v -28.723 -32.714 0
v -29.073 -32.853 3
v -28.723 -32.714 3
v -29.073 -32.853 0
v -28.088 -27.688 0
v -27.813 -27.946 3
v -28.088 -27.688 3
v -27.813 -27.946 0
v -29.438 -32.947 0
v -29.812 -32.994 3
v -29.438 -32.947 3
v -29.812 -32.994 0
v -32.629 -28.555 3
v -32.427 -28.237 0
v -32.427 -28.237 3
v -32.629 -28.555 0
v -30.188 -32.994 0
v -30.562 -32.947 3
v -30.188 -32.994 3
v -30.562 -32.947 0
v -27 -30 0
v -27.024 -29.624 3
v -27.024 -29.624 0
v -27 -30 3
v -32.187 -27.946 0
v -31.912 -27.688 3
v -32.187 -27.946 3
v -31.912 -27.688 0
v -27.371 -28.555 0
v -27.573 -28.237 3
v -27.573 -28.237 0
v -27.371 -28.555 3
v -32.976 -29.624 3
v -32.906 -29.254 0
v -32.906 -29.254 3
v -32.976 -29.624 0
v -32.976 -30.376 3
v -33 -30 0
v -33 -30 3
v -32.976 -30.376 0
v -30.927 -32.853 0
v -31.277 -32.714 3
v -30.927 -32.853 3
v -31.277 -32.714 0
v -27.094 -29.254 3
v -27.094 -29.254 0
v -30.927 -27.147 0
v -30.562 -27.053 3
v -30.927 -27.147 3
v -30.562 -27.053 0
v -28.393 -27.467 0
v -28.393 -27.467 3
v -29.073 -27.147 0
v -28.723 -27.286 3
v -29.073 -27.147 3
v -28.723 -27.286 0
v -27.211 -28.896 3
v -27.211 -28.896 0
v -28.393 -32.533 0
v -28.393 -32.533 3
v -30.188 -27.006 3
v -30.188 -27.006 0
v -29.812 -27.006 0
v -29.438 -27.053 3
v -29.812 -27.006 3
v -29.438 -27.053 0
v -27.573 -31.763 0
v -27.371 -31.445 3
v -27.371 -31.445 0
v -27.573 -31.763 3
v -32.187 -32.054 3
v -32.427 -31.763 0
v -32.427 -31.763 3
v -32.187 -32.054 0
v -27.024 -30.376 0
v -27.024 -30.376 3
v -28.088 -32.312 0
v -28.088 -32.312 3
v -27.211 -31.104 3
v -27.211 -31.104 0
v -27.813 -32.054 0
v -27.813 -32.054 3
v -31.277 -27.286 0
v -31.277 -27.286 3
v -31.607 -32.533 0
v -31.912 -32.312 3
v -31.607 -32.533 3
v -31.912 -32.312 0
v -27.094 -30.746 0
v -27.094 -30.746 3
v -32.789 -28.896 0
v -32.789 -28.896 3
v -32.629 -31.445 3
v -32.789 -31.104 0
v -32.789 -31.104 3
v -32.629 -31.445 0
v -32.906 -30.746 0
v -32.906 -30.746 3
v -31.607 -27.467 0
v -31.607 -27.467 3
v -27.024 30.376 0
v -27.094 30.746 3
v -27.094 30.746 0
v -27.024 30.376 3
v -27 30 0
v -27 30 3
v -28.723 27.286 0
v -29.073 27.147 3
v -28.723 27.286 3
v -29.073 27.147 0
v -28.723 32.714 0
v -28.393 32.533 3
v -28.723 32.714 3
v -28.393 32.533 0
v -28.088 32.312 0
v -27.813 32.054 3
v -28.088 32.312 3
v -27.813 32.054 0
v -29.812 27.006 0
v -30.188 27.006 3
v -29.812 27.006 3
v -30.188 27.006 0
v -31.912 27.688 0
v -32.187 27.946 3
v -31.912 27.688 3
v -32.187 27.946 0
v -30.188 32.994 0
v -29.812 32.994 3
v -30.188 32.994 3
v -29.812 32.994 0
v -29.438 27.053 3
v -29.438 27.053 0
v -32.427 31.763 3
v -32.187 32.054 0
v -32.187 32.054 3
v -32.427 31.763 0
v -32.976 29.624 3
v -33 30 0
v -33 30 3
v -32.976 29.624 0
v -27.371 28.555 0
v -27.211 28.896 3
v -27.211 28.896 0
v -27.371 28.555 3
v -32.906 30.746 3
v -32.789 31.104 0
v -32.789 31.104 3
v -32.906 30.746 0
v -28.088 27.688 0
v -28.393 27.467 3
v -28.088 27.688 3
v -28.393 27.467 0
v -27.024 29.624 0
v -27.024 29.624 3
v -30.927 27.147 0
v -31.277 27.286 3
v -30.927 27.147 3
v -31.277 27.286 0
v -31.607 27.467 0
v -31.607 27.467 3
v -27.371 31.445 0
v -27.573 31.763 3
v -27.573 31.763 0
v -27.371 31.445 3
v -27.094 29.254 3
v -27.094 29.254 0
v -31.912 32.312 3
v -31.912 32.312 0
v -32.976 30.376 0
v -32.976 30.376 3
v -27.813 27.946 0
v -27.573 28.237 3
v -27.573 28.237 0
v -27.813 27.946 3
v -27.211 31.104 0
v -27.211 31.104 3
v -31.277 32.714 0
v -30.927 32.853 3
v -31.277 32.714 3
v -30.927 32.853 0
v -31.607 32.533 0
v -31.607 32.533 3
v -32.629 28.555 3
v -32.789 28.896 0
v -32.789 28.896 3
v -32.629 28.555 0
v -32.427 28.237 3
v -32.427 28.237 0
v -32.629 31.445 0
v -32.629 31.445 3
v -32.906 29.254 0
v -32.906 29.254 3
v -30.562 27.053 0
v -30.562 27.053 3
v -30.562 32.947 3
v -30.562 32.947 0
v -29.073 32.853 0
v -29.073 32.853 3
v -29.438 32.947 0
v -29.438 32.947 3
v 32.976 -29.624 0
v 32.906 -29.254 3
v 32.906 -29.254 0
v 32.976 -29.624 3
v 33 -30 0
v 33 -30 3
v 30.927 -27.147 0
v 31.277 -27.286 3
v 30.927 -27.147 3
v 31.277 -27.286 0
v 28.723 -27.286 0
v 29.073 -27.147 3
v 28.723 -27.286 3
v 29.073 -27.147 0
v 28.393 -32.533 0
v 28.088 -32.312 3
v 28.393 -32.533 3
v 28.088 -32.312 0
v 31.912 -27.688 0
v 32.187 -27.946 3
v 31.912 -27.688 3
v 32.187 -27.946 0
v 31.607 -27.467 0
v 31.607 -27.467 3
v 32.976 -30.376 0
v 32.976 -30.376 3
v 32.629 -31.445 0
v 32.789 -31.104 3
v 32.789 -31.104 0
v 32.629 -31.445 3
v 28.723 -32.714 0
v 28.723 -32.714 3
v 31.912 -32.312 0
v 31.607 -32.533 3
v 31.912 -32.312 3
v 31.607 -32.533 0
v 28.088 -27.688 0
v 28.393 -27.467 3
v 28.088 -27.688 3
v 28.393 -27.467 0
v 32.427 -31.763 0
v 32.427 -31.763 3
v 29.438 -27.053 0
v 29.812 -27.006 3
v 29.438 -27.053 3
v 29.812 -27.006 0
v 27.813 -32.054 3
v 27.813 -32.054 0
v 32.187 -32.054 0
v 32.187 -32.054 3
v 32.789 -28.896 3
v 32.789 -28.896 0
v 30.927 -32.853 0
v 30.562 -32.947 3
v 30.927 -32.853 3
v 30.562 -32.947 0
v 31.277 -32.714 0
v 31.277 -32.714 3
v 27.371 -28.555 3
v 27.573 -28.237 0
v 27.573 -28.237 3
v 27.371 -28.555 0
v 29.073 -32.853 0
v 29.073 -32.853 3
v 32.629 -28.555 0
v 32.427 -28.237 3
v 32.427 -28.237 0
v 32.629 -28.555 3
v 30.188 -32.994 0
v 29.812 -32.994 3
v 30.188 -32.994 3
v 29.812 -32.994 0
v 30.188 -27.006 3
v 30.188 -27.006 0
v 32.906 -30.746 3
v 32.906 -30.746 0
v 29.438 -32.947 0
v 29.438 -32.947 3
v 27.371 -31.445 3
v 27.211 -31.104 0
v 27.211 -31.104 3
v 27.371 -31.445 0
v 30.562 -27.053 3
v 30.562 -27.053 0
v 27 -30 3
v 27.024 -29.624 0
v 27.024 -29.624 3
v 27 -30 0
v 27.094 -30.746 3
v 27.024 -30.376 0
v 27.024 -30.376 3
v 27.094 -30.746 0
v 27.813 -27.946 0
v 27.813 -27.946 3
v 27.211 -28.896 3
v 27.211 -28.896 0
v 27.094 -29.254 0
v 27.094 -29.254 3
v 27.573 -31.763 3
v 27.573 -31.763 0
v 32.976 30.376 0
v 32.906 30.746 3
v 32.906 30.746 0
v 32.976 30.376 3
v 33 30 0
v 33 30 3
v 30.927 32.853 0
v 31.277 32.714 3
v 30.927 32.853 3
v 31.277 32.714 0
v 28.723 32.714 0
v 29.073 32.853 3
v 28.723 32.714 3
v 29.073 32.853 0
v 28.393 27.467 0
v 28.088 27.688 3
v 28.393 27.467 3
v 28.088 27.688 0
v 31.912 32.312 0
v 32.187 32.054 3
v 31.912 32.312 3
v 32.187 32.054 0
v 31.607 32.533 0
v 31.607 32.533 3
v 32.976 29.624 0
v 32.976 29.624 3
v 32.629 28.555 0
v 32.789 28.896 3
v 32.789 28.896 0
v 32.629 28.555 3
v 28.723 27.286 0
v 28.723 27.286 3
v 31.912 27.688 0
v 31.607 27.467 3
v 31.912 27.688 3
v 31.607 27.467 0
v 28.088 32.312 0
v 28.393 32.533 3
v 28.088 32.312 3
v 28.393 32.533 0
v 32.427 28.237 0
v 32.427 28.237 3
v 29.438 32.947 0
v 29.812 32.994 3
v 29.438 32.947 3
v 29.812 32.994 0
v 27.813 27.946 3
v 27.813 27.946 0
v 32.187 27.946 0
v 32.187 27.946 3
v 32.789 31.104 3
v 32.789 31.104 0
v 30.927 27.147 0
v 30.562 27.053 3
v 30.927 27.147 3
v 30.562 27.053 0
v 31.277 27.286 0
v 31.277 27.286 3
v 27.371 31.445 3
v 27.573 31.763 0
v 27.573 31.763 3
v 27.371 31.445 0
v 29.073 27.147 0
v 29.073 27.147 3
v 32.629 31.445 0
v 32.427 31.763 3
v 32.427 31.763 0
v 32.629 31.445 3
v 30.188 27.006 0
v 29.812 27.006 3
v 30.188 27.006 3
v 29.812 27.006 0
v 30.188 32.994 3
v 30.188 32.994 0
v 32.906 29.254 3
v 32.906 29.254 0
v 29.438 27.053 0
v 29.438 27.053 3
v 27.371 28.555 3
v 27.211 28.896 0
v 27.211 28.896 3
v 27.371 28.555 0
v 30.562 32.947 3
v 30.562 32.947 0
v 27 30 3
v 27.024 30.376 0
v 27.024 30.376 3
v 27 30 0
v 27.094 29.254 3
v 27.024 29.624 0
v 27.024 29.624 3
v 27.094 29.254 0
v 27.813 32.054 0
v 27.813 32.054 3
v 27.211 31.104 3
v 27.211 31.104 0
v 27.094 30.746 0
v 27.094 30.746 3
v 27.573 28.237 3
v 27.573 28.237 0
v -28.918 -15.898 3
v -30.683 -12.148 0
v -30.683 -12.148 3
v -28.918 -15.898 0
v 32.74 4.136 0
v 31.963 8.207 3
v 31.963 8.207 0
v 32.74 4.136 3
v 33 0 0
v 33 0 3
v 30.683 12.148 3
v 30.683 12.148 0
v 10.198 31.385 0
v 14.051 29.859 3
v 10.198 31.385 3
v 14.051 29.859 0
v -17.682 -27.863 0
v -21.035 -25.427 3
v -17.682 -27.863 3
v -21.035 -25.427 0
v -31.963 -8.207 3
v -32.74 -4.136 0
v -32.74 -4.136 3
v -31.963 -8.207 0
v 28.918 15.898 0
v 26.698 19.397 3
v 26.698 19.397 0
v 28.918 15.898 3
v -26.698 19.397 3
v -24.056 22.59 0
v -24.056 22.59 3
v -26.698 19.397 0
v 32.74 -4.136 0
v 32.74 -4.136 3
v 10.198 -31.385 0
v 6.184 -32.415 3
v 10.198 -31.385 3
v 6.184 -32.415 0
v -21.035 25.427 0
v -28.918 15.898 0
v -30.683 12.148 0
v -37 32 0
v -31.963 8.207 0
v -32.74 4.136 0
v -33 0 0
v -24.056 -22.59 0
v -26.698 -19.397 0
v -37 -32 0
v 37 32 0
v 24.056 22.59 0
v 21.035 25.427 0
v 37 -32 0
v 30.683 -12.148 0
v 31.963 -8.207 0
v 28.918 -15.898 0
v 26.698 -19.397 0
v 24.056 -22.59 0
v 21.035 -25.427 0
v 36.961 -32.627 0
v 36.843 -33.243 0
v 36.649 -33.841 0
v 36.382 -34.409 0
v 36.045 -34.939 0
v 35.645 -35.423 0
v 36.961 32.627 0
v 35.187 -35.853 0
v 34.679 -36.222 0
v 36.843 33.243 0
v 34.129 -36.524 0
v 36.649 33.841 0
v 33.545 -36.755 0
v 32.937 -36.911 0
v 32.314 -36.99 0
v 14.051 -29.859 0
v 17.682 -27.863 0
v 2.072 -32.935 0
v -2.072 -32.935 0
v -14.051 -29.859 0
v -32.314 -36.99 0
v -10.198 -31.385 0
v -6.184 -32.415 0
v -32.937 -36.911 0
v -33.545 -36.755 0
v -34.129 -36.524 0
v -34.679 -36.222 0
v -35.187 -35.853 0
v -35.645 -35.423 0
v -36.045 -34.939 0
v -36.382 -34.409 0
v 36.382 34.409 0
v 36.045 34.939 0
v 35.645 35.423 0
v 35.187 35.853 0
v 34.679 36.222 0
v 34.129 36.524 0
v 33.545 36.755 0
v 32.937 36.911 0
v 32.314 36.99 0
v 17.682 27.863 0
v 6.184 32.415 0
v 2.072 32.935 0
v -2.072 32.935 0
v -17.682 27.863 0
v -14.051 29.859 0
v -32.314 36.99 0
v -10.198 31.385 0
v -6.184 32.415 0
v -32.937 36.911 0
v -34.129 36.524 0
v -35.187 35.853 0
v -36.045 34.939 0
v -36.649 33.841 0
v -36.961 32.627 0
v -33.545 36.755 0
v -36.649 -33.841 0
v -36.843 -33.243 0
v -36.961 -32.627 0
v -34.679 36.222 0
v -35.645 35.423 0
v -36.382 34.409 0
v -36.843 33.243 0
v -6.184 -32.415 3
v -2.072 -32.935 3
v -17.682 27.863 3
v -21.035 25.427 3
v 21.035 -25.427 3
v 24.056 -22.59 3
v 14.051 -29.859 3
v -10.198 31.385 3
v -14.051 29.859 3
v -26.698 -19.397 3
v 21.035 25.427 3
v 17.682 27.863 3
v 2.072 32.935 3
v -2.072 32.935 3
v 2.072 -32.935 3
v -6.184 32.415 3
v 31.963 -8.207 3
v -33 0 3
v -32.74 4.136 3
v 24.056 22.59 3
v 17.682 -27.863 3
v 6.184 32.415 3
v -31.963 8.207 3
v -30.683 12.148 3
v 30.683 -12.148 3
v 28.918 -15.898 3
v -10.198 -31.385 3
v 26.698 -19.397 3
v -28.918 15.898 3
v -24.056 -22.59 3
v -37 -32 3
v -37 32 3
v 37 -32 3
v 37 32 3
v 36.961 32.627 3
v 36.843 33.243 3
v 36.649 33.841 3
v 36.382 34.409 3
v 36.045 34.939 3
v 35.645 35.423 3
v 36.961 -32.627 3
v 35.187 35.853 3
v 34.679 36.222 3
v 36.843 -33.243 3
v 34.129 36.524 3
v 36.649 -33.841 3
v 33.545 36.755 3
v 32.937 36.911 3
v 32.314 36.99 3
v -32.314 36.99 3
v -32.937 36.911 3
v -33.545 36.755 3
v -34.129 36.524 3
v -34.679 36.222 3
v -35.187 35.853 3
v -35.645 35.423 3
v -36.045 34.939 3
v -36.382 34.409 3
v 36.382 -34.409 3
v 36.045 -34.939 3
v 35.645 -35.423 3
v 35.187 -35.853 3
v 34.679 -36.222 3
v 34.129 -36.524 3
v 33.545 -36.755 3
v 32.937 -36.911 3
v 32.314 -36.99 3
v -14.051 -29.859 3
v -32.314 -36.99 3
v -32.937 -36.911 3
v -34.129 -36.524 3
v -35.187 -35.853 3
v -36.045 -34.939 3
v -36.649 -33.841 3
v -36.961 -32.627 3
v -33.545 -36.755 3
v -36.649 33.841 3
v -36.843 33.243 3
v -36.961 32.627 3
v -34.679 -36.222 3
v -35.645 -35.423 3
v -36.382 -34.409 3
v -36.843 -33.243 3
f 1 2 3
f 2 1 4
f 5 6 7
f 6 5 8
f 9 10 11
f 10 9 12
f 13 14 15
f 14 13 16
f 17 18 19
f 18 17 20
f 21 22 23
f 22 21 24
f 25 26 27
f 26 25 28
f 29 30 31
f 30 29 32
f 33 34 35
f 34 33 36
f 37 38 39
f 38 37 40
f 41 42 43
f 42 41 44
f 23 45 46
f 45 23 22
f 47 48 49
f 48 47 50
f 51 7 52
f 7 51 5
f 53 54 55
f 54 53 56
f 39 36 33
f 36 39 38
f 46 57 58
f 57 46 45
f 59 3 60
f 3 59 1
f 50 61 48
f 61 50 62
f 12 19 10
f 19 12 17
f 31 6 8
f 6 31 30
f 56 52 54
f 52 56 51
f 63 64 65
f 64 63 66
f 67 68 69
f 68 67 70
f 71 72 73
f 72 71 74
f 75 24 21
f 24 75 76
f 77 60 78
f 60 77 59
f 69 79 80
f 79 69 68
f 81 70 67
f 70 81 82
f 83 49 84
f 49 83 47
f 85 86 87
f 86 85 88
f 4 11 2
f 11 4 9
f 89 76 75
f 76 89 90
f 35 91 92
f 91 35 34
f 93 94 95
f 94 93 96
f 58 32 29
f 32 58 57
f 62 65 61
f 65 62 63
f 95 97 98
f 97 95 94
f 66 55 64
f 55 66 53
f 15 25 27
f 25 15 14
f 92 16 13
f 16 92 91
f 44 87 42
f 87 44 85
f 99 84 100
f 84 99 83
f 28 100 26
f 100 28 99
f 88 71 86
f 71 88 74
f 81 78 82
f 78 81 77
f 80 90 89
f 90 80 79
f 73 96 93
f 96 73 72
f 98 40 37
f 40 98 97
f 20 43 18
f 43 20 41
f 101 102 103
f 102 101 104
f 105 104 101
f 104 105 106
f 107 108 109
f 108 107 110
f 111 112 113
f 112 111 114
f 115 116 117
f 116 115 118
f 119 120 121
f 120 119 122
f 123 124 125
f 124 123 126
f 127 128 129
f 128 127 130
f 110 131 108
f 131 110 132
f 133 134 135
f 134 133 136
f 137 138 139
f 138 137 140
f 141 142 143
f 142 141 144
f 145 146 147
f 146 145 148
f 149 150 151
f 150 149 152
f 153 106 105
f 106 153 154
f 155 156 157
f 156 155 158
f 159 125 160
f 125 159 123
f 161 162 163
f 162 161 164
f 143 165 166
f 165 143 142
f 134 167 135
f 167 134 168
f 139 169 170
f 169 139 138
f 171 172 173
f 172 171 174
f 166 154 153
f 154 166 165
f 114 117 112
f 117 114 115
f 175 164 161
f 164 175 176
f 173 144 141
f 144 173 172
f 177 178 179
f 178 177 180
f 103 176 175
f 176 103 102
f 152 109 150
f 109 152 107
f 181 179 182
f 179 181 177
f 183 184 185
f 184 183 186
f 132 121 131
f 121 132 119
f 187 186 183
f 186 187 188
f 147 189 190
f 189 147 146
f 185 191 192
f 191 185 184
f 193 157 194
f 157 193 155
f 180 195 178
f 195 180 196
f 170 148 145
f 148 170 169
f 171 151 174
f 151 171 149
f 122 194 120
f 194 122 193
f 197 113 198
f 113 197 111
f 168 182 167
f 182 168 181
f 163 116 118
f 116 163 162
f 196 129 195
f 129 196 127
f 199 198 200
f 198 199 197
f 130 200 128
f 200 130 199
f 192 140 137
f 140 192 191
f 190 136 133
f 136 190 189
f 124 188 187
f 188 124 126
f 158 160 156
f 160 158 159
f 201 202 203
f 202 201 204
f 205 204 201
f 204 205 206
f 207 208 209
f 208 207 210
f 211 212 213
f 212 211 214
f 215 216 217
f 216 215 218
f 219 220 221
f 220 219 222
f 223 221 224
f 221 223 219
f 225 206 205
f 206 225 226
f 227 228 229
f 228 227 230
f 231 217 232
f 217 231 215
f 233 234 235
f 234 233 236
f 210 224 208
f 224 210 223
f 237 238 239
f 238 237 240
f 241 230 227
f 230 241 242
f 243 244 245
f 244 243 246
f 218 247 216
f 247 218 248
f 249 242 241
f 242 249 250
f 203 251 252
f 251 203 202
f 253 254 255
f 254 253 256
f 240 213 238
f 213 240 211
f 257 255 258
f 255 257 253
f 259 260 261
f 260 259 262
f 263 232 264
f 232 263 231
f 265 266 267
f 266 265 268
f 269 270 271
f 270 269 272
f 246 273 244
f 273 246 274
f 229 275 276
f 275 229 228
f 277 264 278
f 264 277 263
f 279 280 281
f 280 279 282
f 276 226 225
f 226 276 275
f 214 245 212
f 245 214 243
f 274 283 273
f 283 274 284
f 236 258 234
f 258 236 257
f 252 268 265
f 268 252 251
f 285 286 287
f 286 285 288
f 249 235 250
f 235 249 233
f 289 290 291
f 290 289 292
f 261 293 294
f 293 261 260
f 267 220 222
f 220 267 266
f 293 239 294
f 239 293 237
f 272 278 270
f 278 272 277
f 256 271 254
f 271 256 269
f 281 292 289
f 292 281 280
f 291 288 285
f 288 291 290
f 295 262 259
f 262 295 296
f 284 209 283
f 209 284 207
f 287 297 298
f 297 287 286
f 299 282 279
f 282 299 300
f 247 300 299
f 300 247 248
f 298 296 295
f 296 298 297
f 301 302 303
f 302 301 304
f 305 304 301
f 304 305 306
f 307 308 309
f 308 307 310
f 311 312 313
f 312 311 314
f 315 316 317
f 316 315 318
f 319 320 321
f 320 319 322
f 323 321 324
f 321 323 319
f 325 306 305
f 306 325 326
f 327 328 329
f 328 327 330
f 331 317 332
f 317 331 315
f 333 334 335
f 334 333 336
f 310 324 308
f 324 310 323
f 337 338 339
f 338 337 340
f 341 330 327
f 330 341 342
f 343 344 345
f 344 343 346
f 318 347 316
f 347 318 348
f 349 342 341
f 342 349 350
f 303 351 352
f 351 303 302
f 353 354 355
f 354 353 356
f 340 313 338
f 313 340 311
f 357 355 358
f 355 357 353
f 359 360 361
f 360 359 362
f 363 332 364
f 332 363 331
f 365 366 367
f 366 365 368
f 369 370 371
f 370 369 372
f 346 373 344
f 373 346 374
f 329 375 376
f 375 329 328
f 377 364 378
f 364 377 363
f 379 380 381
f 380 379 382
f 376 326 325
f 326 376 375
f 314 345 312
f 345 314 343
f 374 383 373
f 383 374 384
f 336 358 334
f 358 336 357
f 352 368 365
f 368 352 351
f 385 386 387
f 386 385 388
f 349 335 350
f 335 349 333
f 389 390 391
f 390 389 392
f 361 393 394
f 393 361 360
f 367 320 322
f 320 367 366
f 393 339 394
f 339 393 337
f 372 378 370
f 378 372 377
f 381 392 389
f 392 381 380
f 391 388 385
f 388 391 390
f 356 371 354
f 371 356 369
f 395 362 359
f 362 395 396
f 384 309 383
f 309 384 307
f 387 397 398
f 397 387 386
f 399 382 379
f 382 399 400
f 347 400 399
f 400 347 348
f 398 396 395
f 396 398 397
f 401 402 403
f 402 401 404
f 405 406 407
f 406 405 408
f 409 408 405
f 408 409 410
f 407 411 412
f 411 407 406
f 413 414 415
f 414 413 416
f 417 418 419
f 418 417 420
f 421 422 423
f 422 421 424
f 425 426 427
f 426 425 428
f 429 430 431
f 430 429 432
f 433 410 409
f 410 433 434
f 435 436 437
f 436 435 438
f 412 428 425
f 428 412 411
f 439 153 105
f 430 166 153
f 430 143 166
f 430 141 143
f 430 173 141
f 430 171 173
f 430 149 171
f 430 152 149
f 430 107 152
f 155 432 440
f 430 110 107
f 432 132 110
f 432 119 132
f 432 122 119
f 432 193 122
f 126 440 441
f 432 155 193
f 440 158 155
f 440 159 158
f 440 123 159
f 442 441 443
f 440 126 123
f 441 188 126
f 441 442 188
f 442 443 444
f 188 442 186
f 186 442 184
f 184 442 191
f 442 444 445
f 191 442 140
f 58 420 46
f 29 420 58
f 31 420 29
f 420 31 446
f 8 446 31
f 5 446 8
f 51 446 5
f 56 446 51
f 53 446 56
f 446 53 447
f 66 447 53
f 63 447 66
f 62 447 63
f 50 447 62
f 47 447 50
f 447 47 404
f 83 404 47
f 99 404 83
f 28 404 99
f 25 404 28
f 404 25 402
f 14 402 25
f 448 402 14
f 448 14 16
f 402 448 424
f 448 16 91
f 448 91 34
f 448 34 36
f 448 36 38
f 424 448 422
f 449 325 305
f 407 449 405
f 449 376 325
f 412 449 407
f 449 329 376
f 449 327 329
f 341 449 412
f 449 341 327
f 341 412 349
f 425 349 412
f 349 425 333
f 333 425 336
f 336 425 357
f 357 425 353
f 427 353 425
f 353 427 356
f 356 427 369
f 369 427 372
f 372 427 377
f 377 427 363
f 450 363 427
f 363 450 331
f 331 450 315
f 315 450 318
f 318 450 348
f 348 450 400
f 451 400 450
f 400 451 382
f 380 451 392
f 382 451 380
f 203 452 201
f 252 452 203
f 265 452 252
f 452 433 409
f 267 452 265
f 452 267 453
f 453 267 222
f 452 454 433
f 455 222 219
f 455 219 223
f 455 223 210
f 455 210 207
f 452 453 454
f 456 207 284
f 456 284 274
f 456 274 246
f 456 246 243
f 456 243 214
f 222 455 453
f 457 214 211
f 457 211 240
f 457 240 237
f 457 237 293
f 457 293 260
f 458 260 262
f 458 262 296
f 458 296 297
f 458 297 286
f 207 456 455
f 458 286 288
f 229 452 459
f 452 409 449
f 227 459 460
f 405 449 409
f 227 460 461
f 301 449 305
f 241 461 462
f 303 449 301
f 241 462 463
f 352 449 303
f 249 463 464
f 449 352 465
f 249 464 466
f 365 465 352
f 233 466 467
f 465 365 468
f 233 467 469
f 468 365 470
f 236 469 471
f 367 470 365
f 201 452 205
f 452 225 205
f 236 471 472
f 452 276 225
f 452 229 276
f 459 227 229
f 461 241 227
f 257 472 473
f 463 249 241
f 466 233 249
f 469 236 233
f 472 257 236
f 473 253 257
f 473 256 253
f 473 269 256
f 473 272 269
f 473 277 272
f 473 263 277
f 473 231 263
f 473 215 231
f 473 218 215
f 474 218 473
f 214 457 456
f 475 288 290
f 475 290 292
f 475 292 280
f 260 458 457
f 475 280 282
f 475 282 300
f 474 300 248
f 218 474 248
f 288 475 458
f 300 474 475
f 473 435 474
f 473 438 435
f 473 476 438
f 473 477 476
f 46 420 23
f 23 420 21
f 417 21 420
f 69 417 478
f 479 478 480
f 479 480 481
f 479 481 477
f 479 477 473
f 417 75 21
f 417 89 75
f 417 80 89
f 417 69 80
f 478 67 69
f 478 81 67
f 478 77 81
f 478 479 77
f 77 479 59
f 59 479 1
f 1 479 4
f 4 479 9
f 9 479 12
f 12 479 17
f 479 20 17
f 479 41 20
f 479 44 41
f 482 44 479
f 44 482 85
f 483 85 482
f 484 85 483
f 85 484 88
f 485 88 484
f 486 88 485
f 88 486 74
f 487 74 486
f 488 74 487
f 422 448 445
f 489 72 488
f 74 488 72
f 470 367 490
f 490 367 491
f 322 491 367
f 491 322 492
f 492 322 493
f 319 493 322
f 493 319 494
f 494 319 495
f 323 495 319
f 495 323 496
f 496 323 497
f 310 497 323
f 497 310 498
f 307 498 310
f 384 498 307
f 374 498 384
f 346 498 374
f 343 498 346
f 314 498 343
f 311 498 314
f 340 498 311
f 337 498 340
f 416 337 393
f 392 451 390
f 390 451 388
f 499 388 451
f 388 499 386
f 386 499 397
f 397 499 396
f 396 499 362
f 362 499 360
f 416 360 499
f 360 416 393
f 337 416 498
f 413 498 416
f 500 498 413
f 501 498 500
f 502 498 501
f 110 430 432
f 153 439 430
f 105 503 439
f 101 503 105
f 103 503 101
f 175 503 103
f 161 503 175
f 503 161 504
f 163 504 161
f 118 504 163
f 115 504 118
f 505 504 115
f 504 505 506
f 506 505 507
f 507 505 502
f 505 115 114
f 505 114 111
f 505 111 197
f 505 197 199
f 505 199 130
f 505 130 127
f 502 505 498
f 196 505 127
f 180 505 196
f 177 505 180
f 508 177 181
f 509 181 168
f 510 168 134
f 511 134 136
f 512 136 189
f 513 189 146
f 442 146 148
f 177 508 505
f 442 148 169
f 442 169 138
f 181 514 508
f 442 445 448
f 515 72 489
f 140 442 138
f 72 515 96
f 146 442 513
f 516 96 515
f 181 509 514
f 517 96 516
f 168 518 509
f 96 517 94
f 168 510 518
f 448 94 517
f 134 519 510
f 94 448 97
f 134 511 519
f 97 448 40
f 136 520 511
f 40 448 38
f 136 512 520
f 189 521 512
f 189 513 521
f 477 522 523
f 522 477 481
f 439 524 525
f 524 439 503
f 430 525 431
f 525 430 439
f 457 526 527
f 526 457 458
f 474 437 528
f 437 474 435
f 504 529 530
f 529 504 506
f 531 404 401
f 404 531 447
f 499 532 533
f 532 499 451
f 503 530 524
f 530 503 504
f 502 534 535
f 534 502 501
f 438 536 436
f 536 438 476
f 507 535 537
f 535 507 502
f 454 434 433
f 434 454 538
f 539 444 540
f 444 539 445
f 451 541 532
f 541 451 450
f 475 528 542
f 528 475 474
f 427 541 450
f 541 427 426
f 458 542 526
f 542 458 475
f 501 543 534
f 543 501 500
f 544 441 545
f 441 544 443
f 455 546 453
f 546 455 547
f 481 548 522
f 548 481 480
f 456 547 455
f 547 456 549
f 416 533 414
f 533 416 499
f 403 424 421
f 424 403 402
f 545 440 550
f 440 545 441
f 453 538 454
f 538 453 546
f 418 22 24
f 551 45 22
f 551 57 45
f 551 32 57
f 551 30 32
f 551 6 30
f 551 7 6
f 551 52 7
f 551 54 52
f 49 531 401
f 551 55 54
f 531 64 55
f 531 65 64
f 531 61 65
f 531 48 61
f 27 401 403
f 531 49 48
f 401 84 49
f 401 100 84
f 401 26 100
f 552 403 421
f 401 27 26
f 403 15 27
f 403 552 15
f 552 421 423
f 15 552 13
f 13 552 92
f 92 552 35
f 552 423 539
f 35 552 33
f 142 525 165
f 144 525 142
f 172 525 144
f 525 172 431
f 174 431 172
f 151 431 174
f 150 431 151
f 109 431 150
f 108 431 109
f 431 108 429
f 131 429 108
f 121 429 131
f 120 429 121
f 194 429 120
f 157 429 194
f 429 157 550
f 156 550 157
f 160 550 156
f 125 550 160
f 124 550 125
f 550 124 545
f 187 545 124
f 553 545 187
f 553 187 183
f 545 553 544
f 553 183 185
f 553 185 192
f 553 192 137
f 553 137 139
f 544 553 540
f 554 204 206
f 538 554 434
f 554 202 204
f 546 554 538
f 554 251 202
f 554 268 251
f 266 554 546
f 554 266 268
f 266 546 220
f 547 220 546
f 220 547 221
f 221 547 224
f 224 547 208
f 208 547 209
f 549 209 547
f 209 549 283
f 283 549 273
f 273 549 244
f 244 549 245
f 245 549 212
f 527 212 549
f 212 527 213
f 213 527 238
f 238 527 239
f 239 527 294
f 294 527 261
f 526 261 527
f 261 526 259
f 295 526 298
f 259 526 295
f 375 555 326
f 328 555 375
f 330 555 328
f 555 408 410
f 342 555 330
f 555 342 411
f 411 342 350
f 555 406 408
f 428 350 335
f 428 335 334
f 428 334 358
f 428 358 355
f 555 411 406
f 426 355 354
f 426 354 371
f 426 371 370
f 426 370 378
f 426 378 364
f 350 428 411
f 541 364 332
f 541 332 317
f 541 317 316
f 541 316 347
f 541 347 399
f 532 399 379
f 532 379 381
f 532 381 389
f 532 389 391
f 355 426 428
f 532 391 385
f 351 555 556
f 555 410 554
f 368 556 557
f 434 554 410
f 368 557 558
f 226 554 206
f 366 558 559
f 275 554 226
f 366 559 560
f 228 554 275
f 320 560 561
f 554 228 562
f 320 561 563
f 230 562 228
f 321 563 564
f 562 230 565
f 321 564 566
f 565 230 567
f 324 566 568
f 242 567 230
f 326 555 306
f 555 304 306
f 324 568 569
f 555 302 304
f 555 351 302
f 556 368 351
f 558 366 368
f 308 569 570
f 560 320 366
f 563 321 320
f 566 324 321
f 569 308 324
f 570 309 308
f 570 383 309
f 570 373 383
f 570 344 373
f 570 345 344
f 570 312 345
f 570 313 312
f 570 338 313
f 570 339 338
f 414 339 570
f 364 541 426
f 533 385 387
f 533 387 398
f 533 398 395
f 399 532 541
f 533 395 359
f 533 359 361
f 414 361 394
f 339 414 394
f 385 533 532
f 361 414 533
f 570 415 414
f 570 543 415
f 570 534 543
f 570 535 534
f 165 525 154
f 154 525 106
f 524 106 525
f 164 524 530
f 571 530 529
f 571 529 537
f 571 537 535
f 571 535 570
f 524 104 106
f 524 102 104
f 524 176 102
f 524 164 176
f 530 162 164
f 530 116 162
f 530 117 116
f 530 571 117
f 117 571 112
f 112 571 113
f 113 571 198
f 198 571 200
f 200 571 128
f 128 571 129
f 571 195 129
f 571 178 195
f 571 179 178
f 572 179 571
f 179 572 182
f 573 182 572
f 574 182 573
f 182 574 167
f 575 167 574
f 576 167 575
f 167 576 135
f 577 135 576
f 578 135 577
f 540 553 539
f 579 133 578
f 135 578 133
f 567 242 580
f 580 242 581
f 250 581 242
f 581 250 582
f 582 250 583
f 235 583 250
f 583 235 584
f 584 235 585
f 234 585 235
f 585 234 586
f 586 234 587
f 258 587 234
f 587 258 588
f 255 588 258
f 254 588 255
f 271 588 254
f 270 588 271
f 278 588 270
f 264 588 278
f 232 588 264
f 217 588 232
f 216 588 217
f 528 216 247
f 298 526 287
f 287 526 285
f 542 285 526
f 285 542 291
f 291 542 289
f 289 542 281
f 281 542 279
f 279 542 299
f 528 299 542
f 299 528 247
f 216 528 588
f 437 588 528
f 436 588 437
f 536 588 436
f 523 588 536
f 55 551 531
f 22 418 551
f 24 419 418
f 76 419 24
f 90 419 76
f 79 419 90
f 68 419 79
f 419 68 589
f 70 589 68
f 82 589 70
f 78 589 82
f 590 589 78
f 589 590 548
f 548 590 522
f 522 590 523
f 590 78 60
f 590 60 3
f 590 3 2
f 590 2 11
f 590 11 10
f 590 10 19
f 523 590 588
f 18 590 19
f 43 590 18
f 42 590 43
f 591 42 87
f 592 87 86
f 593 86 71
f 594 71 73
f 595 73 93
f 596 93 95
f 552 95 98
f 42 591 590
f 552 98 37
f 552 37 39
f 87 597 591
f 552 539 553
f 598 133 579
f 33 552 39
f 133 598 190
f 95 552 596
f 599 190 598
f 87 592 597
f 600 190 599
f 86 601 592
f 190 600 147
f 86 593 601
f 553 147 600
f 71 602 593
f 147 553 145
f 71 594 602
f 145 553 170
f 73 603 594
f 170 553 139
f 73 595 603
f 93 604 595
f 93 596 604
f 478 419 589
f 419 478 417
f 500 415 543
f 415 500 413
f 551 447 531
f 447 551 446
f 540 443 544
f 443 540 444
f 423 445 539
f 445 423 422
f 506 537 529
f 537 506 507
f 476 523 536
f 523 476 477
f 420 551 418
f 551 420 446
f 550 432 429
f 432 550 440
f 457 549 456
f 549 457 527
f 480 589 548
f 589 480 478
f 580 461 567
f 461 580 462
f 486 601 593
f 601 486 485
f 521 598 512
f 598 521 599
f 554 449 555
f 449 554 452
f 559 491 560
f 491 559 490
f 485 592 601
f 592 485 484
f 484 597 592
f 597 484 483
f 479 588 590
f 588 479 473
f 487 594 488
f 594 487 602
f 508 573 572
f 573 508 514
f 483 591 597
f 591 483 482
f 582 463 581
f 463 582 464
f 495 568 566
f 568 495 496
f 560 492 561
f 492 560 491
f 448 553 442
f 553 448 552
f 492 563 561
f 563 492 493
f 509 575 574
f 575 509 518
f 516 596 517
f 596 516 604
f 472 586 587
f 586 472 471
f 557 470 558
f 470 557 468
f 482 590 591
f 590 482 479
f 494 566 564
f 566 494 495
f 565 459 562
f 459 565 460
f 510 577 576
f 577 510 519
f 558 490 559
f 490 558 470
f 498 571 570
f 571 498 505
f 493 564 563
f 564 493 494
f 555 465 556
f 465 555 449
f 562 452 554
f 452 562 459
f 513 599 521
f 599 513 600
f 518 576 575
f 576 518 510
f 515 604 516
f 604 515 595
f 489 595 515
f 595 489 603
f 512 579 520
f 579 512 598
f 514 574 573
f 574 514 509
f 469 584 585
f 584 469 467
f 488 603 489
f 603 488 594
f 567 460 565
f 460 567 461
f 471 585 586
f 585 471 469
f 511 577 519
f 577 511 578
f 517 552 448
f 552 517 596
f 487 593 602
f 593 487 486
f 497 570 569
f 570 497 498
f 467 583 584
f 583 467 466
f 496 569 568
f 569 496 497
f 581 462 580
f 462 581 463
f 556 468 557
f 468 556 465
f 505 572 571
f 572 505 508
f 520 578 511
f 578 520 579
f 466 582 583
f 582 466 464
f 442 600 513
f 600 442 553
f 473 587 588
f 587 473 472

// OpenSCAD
$fn = 50;


difference() {
	union() {
		hull() {
			translate(v = [-32.0000000000, 32.0000000000, 0]) {
				cylinder(h = 3, r = 5);
			}
			translate(v = [32.0000000000, 32.0000000000, 0]) {
				cylinder(h = 3, r = 5);
			}
			translate(v = [-32.0000000000, -32.0000000000, 0]) {
				cylinder(h = 3, r = 5);
			}
			translate(v = [32.0000000000, -32.0000000000, 0]) {
				cylinder(h = 3, r = 5);
			}
		}
	}
	union() {
		#translate(v = [-30.0000000000, -30.0000000000, -100.0000000000]) {
			cylinder(h = 200, r = 3.0000000000);
		}
		#translate(v = [-30.0000000000, 30.0000000000, -100.0000000000]) {
			cylinder(h = 200, r = 3.0000000000);
		}
		#translate(v = [30.0000000000, -30.0000000000, -100.0000000000]) {
			cylinder(h = 200, r = 3.0000000000);
		}
		#translate(v = [30.0000000000, 30.0000000000, -100.0000000000]) {
			cylinder(h = 200, r = 3.0000000000);
		}
		#cylinder(h = 3, r = 33.0000000000);
	}
}
